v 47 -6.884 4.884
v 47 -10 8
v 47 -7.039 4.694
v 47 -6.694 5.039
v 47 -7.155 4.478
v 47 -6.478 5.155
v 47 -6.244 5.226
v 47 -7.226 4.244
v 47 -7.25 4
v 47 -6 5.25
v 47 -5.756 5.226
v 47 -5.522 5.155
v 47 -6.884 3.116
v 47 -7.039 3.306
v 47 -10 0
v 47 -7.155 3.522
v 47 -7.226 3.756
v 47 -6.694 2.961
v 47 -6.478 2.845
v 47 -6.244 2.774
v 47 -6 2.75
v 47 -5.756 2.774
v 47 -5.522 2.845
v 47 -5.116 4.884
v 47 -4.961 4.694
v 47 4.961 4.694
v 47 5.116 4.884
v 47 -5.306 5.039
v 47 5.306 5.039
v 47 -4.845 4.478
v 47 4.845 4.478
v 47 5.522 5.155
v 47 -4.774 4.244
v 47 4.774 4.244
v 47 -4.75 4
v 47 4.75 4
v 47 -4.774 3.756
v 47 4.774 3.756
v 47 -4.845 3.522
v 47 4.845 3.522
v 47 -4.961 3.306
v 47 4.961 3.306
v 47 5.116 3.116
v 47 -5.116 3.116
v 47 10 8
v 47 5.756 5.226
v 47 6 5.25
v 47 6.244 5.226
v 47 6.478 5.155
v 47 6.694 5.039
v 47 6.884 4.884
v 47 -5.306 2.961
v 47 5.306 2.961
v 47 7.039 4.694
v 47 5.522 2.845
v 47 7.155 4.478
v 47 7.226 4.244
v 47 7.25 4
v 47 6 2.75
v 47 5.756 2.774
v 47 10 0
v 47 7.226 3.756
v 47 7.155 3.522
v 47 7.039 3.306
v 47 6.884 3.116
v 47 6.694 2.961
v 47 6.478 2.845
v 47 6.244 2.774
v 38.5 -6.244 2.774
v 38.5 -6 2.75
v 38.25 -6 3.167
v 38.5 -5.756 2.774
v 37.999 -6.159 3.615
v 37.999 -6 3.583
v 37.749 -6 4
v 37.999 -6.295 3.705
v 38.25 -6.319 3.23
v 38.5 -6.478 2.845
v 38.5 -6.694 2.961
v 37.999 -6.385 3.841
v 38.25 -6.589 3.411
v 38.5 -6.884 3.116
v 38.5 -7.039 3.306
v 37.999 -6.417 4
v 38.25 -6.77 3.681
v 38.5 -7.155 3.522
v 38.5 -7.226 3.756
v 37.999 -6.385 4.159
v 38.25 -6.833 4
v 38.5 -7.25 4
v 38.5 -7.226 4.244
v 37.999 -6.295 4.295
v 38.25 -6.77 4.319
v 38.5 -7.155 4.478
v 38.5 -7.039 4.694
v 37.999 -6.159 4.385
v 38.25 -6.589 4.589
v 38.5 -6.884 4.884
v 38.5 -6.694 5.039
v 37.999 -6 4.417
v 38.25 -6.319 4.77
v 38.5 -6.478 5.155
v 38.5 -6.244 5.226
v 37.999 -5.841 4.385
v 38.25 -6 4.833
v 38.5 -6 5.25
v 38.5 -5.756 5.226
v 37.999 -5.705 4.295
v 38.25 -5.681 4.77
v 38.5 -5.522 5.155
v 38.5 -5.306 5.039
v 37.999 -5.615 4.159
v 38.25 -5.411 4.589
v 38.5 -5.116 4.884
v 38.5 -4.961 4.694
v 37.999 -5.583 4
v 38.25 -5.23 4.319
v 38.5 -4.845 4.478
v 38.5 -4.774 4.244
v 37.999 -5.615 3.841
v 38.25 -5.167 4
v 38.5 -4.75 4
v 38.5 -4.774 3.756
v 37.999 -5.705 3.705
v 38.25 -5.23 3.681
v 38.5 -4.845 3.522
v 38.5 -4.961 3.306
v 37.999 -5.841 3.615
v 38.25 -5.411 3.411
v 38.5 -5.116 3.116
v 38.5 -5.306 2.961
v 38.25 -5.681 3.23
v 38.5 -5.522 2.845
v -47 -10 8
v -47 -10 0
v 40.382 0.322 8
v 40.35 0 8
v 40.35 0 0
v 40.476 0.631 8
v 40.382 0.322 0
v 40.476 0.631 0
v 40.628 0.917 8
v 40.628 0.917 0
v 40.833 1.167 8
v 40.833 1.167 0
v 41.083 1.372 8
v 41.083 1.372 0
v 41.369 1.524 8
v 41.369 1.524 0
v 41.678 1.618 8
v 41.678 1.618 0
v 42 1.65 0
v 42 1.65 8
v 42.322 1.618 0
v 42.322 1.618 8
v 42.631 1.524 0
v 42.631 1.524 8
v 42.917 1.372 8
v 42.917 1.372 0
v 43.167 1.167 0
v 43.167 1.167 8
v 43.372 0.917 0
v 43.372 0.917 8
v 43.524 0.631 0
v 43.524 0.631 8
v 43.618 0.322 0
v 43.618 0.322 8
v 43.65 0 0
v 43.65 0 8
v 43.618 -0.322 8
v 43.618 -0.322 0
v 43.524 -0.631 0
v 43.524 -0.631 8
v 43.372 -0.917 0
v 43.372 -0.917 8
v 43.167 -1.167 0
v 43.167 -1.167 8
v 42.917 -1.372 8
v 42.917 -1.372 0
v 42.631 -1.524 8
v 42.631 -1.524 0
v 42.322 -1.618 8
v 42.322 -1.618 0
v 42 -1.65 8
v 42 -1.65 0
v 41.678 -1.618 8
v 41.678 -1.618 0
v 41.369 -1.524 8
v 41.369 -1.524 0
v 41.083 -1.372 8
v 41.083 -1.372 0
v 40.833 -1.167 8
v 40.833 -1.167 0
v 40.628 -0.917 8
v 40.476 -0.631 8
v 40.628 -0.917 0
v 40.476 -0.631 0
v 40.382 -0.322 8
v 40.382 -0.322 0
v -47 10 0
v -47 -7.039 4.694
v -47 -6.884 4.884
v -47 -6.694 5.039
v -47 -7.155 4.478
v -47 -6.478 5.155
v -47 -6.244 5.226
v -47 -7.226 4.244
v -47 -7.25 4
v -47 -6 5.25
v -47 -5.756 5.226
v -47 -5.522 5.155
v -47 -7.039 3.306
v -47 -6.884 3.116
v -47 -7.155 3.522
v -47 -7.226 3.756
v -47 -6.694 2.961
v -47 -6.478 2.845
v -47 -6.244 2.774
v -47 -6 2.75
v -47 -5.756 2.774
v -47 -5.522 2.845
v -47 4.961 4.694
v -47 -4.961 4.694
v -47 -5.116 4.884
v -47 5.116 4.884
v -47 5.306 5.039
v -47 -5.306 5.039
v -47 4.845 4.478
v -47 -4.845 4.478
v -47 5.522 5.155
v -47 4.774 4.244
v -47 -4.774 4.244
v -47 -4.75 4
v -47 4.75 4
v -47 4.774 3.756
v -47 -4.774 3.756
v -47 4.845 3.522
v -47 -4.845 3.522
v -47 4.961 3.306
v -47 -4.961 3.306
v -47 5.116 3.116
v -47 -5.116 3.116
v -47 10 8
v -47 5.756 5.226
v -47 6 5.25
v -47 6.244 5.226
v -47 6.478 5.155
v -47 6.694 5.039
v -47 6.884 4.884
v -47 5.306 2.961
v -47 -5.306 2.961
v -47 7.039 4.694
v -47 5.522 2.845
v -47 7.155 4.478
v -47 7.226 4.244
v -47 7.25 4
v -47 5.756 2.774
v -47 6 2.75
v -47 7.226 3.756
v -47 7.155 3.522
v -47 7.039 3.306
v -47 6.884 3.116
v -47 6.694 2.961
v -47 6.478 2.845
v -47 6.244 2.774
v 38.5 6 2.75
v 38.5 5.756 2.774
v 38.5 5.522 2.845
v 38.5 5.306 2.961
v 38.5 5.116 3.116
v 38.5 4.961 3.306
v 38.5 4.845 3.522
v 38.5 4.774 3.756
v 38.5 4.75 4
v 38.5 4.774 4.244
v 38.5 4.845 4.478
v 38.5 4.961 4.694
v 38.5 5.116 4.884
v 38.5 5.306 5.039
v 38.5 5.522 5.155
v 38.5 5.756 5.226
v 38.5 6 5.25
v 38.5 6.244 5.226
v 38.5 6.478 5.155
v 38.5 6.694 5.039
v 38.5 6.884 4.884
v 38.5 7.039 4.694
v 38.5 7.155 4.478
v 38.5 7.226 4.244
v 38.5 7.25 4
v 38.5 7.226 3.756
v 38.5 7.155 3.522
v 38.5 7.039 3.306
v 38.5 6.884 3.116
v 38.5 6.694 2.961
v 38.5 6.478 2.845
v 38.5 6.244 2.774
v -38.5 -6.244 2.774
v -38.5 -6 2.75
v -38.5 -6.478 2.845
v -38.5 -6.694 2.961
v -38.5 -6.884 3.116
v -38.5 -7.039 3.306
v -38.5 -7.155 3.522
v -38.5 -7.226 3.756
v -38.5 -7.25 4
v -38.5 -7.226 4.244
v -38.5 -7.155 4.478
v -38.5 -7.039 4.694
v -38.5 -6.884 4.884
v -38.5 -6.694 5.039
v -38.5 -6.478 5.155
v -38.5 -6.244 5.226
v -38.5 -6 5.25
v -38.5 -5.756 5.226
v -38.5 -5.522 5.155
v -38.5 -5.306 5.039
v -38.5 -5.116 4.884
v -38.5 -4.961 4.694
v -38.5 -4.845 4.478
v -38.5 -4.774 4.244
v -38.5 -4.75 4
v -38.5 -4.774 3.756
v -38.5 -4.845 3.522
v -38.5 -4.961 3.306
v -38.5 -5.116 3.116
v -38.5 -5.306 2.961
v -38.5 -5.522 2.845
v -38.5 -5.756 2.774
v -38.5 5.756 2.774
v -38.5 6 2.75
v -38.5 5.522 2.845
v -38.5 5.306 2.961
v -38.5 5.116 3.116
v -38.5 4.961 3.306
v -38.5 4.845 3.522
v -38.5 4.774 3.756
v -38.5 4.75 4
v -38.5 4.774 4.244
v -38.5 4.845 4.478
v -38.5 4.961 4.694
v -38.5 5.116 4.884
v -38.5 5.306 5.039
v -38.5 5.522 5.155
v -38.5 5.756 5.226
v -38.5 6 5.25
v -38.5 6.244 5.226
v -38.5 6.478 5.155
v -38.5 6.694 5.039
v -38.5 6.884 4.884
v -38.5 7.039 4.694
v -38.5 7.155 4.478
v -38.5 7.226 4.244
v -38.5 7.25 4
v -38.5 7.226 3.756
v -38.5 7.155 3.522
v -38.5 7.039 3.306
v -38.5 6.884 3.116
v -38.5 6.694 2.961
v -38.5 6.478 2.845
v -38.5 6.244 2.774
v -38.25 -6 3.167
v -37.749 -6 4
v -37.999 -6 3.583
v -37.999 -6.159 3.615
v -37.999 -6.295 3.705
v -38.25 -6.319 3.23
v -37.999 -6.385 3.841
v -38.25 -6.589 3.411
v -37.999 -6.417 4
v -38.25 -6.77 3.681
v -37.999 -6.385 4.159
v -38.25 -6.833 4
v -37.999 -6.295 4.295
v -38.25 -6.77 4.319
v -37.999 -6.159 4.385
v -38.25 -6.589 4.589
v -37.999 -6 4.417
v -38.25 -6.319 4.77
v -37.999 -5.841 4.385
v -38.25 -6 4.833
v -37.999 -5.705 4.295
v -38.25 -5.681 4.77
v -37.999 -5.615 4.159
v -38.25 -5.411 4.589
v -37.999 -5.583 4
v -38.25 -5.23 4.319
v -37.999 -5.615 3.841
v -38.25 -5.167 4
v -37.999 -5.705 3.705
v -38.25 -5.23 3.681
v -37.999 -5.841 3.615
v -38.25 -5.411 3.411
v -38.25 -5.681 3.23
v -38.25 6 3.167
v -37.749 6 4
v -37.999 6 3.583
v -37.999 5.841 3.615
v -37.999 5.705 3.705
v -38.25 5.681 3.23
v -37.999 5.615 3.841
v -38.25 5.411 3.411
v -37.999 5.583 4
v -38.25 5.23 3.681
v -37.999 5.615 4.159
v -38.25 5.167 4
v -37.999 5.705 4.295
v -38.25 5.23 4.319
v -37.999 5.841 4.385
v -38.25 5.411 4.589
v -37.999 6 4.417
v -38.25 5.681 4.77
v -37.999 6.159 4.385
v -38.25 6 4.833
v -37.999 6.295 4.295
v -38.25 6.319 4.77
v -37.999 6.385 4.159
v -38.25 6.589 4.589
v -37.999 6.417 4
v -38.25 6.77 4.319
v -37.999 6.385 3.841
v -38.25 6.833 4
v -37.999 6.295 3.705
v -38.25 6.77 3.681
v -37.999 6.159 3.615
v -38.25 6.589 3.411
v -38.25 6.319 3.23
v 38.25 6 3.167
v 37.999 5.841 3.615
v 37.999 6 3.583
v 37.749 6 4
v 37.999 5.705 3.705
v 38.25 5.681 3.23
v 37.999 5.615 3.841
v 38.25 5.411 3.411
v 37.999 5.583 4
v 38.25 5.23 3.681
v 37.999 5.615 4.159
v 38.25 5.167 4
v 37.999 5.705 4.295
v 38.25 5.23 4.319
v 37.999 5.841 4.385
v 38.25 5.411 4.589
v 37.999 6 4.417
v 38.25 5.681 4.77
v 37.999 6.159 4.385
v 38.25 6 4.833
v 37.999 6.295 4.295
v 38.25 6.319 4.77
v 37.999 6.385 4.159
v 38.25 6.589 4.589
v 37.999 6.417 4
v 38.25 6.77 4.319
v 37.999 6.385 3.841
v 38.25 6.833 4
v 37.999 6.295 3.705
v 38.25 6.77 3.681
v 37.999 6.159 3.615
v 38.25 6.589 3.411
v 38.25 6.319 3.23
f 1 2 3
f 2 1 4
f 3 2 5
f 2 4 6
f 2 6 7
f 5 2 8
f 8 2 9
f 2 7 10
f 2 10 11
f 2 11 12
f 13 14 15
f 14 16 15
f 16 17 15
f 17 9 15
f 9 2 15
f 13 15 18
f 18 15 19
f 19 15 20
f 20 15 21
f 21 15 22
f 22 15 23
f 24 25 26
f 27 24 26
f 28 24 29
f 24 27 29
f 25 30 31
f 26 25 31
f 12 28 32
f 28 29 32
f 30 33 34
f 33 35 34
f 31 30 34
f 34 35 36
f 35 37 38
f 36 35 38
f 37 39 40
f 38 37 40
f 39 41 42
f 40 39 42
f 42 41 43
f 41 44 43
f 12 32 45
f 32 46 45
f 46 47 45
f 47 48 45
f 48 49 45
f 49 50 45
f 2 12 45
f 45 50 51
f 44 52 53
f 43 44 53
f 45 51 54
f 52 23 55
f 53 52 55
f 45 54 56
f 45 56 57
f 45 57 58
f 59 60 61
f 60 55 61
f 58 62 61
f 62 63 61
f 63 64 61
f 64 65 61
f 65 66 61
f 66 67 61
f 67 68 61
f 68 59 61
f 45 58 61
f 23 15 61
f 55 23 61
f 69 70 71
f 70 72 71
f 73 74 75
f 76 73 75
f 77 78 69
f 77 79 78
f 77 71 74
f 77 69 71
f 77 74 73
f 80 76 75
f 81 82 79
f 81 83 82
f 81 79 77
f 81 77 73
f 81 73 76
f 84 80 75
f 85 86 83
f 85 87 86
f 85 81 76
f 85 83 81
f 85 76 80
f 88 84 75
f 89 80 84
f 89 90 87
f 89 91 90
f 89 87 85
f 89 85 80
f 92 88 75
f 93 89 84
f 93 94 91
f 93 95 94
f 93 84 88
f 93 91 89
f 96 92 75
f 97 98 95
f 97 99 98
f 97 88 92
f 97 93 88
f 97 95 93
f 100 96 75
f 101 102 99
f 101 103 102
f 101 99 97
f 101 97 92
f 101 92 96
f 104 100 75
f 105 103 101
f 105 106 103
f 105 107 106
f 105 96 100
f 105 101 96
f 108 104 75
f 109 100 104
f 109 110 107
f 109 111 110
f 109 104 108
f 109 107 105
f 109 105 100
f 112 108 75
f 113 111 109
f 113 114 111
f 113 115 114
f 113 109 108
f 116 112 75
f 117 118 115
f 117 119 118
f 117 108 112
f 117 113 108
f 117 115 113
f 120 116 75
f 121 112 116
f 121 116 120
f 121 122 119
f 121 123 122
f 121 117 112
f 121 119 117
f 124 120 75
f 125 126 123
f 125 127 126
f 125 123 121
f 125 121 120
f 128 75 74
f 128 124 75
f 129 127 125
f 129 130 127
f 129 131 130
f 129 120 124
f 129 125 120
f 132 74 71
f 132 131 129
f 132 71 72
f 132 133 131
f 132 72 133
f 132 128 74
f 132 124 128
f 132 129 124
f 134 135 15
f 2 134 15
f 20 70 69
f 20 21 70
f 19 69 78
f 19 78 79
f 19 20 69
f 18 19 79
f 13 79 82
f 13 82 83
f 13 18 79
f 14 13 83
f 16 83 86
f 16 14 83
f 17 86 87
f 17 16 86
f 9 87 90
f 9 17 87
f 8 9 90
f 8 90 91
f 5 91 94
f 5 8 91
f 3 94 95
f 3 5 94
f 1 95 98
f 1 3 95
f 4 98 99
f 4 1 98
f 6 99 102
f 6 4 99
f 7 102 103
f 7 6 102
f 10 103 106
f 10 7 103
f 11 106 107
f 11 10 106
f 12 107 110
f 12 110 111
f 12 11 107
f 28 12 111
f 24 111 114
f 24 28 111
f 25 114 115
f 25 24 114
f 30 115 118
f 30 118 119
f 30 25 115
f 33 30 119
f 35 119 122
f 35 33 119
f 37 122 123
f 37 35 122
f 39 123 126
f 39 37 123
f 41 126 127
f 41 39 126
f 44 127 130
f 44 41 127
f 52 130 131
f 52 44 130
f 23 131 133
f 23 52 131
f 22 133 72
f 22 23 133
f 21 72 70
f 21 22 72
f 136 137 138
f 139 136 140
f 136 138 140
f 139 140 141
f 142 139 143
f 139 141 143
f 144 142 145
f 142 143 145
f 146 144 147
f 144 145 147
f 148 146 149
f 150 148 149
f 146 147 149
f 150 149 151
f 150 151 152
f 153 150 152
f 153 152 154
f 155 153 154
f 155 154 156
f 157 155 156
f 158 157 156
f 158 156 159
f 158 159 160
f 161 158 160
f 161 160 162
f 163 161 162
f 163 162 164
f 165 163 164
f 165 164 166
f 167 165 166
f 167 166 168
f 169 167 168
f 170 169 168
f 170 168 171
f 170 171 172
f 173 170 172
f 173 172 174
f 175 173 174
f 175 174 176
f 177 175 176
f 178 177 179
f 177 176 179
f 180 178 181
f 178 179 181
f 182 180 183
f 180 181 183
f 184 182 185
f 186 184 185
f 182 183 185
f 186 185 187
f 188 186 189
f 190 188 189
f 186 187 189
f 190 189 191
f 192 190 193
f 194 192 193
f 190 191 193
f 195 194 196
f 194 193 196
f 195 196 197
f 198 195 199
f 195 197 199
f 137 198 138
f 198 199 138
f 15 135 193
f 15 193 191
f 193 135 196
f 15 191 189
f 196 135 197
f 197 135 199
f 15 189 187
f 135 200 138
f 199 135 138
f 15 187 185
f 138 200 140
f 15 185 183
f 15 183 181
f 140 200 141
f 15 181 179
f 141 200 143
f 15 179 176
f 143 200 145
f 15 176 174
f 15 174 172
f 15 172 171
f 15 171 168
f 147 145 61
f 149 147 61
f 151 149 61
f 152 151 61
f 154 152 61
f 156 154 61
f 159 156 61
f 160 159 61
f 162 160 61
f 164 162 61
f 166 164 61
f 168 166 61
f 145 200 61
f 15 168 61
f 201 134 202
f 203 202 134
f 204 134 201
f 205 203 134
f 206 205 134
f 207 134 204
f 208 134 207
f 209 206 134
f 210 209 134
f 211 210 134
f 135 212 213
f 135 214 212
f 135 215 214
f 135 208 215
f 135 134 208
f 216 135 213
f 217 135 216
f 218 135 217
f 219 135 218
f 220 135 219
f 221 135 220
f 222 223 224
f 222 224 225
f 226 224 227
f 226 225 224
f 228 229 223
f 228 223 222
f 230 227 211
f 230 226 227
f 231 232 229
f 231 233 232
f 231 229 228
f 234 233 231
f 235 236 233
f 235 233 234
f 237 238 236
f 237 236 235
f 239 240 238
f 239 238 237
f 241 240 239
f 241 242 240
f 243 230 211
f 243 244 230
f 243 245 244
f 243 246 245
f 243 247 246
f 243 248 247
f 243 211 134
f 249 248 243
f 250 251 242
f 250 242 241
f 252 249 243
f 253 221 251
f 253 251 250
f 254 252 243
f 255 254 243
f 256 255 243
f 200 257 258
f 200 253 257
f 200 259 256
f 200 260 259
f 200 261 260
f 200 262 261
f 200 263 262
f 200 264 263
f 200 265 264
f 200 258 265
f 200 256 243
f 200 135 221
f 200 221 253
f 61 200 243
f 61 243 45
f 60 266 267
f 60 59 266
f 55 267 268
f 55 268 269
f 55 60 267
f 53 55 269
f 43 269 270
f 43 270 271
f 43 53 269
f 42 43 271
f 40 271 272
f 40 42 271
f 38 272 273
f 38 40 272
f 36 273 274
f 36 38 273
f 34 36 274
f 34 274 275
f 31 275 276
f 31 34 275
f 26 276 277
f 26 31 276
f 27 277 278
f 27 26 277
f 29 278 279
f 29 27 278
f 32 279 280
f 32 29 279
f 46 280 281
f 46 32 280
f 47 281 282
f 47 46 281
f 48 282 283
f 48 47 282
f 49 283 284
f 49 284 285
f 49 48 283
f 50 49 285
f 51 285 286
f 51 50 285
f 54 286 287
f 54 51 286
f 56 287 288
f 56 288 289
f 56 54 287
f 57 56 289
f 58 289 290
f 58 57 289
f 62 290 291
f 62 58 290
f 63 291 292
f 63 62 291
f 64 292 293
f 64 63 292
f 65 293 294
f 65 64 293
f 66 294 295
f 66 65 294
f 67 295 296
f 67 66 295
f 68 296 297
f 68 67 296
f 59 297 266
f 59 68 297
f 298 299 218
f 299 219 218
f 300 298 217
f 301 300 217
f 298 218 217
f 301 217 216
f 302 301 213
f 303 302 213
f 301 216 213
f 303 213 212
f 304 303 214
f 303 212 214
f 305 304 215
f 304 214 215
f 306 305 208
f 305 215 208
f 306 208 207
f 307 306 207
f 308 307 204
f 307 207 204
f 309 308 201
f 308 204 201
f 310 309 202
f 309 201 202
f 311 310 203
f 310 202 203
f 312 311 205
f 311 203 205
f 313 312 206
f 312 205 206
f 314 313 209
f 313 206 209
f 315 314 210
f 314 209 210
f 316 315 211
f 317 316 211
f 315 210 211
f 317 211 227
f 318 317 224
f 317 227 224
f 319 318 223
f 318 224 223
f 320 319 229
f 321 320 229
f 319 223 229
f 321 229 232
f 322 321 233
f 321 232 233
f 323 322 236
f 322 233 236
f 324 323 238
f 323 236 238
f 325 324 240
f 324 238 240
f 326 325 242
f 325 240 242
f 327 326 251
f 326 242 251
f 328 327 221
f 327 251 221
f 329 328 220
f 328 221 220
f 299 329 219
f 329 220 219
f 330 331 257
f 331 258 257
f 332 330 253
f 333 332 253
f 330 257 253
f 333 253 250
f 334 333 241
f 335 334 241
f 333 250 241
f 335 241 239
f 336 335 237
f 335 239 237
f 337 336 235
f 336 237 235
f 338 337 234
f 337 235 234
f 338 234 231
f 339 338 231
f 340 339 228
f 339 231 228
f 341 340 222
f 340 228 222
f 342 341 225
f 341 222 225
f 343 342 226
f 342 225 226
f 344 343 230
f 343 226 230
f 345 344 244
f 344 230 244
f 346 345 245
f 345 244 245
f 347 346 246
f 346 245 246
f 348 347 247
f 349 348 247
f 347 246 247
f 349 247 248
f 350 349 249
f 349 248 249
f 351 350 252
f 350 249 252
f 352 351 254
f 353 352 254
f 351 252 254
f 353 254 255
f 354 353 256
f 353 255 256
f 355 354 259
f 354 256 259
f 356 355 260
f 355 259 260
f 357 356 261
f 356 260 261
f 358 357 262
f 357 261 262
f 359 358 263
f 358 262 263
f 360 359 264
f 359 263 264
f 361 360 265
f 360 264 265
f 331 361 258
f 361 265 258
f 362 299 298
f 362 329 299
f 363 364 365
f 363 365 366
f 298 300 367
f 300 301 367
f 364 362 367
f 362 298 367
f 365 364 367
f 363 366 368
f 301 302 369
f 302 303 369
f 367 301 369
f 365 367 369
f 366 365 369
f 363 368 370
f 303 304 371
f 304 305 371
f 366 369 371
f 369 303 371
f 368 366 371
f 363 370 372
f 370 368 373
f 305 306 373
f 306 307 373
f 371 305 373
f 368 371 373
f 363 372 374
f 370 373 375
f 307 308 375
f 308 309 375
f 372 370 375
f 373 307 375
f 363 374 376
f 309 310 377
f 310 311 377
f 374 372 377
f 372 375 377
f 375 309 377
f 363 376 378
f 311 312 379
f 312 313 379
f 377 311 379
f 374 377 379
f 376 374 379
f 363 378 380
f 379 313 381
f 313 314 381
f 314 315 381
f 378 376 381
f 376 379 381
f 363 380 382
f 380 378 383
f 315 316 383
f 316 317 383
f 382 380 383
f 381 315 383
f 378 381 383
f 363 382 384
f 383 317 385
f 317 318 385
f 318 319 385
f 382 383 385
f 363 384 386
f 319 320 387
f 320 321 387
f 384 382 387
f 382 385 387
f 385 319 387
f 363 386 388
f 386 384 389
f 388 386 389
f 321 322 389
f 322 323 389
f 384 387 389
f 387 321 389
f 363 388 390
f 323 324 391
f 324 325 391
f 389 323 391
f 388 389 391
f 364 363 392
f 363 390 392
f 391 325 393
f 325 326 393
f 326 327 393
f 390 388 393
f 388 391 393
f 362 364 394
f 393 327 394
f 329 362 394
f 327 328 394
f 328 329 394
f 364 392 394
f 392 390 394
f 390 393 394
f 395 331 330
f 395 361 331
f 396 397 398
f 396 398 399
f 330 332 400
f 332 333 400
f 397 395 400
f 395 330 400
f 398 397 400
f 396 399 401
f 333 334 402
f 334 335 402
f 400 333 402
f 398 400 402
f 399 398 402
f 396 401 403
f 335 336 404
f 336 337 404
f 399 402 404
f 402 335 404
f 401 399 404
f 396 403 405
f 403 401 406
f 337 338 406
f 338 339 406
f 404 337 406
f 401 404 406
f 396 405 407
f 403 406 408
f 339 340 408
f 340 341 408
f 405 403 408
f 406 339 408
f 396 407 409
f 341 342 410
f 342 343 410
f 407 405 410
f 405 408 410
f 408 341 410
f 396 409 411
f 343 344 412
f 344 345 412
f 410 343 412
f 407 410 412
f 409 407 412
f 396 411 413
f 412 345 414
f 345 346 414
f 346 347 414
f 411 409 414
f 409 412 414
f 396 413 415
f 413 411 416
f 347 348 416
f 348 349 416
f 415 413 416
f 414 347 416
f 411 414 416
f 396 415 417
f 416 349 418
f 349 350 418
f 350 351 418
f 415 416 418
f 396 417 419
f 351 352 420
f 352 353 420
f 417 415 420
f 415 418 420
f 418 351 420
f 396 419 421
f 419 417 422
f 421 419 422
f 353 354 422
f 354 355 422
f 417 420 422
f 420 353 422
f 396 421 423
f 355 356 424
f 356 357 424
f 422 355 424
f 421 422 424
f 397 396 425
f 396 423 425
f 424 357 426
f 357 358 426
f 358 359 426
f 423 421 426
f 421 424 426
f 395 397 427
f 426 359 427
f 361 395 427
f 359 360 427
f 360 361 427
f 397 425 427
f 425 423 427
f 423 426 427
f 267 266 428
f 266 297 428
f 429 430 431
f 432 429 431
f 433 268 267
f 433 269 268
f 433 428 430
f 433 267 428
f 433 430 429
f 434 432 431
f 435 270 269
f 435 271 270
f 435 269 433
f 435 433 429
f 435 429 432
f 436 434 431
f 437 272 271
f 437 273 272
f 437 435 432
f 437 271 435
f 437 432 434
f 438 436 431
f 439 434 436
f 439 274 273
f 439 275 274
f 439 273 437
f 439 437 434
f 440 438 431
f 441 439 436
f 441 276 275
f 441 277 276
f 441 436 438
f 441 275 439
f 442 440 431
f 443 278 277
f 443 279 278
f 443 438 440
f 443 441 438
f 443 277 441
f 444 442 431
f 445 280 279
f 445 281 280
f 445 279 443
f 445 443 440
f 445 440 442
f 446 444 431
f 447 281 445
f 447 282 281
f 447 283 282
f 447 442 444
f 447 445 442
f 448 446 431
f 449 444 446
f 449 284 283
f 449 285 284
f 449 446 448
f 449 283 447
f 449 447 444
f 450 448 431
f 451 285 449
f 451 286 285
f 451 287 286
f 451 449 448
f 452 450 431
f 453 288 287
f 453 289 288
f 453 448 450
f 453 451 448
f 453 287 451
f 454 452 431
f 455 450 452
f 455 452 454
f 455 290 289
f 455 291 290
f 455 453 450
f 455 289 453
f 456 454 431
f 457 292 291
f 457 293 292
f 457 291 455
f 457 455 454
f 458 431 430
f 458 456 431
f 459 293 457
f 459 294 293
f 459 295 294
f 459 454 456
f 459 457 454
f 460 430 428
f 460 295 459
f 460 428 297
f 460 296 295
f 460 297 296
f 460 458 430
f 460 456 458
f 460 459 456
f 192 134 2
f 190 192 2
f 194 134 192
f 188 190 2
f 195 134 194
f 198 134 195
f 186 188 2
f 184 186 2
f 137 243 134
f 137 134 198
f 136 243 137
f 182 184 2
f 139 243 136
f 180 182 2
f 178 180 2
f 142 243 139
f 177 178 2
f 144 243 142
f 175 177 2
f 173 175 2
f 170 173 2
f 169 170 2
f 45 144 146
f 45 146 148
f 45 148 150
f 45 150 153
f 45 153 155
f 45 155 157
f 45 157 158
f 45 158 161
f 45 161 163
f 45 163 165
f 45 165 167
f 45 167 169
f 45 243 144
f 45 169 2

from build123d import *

# Parameters (mm, degrees)
SKETCH_1_W                      = 94
SKETCH_1_H                      = 20
EXTRUDE_1_DEPTH                 = 8
M4_ALTADJUST_D                  = 3.3
M4_ALTADJUST_DEPTH              = 8
M3_HORIZONTALBAR_FIX_AT_2_COUNT = 2
M3_HORIZONTALBAR_FIX_AT_2_PITCH = 12


with BuildPart() as part:
    # 스케치1 → 보스-돌출1 (new body)
    with BuildSketch(Plane.XY):
        Rectangle(SKETCH_1_W, SKETCH_1_H)
    extrude(amount=EXTRUDE_1_DEPTH)

    # M4-ALTADJUST
    with Locations(Plane.XY.offset(8)):
        with Locations((42, 0)):
            Hole(M4_ALTADJUST_D / 2, depth=M4_ALTADJUST_DEPTH)

    # 스케치5 → M3-HORIZONTALBAR_FIX (revolve, cut)
    with BuildSketch(Plane(origin=(47, 6, 4), x_dir=(0, 0, -1), z_dir=(0, 1, 0))):
        Polygon((0, 0), (0, 9.251075774), (1.25, 8.5), (1.25, 0), align=None)
    m3_horizontalbar_fix = revolve(axis=Axis((53.35, 6, 4), (-1, 0, 0)), mode=Mode.SUBTRACT)

    # M3-HORIZONTALBAR_FIX at 2: M3-HORIZONTALBAR_FIX ×2
    with Locations(*[(0, -i * M3_HORIZONTALBAR_FIX_AT_2_PITCH, 0) for i in range(1, M3_HORIZONTALBAR_FIX_AT_2_COUNT)]):
        add(m3_horizontalbar_fix, mode=Mode.SUBTRACT)

    # 대칭 복사1: M3-HORIZONTALBAR_FIX across plane
    add(m3_horizontalbar_fix.mirror(Plane(origin=(0, 0, 0), x_dir=(0, 0, 1), z_dir=(1, 0, 0))), mode=Mode.SUBTRACT)

    # 대칭 복사1 copy 1 sketch → 대칭 복사1 copy 1 (revolve, cut)
    with BuildSketch(Plane(origin=(-47, -6, 4), x_dir=(0, 0, -1), z_dir=(0, 1, 0))):
        Polygon((0, 0), (0, -9.251075774), (1.25, -8.5), (1.25, 0), align=None)
    revolve(axis=Axis((-53.35, -6, 4), (-1, 0, 0)), mode=Mode.SUBTRACT)


solid = part.part
